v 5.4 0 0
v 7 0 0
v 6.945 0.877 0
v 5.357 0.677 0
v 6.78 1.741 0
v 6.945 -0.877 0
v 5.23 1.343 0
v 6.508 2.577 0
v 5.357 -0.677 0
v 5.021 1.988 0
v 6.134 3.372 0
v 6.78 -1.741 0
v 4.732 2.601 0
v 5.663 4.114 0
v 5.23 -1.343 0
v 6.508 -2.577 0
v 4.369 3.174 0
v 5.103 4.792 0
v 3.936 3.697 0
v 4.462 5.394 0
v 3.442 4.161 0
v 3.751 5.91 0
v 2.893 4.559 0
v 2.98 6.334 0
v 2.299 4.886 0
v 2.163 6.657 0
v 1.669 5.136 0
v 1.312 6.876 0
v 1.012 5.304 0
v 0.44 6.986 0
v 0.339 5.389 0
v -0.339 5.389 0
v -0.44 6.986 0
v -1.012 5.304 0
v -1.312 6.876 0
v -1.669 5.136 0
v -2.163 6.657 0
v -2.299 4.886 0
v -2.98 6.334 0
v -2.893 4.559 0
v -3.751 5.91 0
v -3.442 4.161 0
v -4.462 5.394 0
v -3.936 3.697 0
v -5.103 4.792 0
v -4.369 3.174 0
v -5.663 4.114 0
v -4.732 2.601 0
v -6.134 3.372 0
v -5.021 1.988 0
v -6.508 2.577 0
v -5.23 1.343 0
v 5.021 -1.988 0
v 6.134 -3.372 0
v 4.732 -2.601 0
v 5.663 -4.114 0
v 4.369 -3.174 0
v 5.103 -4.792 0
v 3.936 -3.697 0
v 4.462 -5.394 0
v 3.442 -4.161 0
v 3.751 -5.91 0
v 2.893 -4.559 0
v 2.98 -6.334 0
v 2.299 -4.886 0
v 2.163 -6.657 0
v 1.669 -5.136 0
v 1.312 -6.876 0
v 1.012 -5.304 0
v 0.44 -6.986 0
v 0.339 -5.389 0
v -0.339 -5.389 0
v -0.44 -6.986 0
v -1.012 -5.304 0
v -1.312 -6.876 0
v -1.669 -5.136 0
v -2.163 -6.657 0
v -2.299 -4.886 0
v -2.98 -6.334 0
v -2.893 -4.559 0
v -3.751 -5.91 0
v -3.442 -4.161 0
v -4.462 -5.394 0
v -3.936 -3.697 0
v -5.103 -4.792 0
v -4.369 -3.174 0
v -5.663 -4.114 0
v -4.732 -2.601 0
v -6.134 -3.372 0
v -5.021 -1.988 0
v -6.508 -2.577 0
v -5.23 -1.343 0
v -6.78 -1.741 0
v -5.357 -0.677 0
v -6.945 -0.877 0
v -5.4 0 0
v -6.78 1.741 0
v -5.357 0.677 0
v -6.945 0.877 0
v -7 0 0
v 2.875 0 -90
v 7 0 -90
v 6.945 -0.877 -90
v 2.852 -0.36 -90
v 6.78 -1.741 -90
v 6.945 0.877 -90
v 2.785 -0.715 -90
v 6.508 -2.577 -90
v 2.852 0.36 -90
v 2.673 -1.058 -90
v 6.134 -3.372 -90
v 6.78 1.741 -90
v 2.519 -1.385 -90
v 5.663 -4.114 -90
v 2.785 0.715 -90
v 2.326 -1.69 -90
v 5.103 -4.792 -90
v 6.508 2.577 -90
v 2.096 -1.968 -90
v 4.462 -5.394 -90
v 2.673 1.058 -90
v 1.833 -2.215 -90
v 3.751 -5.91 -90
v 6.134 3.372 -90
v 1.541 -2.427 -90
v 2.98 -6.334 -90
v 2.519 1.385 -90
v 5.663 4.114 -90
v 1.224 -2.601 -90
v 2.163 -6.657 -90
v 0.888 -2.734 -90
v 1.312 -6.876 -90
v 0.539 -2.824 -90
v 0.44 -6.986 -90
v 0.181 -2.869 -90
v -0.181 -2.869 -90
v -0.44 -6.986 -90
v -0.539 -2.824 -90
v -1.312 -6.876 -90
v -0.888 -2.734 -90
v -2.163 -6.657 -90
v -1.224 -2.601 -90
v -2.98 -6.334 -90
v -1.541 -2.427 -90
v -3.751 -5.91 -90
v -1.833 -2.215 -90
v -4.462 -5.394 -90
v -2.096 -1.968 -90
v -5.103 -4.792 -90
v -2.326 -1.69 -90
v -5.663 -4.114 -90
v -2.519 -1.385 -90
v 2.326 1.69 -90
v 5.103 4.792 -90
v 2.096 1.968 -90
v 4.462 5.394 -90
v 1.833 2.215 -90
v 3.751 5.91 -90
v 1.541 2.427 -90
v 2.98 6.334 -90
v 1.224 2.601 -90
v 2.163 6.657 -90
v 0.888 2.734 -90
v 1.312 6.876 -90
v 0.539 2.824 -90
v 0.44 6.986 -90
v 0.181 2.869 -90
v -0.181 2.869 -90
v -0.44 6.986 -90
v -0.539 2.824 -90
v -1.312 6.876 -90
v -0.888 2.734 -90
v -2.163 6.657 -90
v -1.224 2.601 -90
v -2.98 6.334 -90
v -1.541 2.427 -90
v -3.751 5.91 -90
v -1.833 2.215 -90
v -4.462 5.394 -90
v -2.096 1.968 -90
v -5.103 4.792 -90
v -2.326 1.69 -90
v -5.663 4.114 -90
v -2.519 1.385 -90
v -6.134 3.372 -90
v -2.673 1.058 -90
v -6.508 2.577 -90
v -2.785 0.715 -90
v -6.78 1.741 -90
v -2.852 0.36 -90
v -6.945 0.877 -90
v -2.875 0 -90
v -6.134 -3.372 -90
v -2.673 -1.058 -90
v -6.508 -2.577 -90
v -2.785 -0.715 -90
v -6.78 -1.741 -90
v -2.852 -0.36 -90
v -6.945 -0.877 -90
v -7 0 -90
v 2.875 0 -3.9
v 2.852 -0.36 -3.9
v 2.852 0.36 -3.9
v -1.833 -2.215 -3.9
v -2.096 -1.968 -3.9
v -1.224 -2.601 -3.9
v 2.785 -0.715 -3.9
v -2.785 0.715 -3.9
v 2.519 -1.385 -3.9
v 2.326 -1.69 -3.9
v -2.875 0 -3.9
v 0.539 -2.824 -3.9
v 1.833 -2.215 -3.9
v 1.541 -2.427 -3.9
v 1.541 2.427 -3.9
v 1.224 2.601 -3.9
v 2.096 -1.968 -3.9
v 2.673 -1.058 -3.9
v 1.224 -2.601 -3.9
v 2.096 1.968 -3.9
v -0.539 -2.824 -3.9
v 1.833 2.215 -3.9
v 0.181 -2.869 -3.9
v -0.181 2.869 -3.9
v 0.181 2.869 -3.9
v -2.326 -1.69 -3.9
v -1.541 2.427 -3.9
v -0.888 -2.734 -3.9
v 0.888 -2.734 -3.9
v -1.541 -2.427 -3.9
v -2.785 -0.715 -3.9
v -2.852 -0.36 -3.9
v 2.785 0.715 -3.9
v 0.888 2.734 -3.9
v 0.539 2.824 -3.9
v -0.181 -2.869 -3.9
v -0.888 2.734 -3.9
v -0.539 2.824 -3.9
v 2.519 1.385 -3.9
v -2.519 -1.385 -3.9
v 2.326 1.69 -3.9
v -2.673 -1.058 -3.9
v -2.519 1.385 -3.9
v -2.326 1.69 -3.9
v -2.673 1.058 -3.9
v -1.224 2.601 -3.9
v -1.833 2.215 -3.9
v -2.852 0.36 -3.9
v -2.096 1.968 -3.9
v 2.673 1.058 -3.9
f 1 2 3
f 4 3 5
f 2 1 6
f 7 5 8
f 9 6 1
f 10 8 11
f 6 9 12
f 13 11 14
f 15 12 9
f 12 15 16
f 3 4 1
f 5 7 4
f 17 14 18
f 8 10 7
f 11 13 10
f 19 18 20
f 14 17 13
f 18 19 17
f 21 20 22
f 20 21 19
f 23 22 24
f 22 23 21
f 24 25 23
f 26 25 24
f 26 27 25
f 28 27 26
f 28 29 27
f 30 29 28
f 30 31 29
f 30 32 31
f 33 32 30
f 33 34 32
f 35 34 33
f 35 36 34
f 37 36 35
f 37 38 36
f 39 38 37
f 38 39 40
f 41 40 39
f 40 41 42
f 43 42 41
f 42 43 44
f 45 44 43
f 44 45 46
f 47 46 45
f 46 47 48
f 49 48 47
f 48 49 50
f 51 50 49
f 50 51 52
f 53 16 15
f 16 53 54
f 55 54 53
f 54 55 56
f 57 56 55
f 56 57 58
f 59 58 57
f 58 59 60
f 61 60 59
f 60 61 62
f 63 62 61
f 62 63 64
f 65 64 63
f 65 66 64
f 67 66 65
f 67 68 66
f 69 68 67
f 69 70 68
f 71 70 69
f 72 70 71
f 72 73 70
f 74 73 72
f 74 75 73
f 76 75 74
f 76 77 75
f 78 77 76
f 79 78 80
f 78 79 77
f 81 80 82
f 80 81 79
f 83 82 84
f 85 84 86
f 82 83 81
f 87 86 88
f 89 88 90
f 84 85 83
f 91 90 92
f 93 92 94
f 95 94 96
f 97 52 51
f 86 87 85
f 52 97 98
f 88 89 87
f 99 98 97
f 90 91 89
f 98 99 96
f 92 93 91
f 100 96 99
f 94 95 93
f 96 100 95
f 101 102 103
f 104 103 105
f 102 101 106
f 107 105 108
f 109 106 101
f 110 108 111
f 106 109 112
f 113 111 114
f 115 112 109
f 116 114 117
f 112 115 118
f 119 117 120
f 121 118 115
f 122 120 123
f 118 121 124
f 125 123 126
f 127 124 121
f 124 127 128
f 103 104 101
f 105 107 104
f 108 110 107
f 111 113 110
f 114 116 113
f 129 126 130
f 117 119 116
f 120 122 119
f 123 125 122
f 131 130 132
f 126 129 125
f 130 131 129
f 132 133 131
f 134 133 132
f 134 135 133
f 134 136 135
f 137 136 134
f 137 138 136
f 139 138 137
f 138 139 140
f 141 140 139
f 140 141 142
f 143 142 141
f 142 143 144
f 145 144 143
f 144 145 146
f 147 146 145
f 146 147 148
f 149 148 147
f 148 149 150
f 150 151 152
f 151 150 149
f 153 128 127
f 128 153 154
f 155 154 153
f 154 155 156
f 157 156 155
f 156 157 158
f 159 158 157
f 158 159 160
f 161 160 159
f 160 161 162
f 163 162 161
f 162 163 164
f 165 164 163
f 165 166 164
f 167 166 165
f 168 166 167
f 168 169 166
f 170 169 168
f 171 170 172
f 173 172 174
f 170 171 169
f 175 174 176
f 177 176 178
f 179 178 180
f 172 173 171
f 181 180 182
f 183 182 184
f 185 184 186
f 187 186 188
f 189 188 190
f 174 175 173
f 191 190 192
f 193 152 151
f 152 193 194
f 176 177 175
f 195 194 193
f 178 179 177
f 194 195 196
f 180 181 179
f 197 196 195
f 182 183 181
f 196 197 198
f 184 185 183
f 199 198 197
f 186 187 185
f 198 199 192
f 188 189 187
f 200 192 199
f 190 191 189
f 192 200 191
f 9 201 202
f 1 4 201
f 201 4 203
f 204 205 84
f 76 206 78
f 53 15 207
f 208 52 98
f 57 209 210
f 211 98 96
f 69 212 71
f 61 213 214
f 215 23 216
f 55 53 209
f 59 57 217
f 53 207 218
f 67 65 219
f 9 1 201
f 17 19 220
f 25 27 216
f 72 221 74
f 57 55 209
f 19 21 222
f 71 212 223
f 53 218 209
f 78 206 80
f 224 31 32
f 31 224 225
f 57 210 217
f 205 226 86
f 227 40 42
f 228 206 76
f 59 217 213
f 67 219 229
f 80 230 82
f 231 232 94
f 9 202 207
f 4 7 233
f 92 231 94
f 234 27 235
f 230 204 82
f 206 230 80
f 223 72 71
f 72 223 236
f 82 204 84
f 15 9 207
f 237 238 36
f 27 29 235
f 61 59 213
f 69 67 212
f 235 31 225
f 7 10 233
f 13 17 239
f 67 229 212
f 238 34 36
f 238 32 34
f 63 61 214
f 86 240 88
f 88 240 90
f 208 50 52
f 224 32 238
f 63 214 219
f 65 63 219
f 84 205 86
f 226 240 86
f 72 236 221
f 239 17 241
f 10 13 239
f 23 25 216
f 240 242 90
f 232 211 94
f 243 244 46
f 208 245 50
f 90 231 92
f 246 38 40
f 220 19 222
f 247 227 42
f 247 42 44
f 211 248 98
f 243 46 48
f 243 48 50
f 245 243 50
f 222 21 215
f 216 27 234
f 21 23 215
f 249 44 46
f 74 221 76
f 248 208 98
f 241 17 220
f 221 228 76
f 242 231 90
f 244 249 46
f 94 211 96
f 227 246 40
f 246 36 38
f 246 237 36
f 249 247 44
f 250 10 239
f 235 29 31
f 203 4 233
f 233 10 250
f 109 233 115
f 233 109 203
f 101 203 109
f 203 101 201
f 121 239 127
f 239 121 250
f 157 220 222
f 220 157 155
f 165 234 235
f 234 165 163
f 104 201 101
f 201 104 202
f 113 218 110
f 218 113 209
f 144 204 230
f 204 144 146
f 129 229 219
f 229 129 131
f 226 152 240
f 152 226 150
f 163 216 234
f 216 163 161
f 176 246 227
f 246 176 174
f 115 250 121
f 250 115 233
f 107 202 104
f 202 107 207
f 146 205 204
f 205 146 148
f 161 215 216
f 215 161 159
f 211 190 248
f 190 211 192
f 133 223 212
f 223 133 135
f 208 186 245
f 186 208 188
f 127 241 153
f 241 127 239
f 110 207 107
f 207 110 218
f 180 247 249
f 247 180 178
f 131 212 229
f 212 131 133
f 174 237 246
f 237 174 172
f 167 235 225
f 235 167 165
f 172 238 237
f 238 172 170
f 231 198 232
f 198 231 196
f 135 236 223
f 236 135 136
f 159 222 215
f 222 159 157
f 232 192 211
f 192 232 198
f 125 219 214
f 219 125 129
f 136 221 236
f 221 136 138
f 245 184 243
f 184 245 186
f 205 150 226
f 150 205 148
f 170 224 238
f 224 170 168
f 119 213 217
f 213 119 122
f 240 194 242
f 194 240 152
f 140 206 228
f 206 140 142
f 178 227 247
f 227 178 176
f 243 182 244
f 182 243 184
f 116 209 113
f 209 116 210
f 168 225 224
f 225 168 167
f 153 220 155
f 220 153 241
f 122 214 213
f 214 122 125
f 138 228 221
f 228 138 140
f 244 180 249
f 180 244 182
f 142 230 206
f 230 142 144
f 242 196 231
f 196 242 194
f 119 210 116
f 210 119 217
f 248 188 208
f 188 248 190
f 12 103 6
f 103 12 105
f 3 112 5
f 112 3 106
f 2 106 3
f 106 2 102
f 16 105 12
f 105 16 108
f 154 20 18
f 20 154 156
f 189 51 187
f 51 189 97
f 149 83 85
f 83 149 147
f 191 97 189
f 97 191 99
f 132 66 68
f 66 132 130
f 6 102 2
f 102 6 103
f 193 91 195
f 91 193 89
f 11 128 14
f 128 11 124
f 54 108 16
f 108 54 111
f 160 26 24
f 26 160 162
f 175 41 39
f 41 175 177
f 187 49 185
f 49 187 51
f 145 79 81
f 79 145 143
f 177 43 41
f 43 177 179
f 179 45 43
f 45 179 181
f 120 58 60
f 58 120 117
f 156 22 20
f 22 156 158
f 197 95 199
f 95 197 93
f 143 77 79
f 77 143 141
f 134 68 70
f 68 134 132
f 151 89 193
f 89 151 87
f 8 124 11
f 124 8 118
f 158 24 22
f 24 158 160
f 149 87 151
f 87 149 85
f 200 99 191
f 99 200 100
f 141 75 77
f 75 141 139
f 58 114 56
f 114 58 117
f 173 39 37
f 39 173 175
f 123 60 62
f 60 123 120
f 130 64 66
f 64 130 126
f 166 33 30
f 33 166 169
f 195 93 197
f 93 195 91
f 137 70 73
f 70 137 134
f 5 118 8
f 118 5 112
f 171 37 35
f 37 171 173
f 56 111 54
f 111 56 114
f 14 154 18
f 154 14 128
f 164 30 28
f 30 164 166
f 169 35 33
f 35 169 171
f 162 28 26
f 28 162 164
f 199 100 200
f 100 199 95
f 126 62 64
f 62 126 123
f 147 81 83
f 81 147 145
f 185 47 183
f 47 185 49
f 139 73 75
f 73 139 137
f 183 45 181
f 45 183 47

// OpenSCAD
$fn = 50;


difference() {
	union() {
		translate(v = [0, 0, -90.0000000000]) {
			cylinder(h = 90, r = 7.0000000000);
		}
		cylinder(h = 0, r = 13.0000000000);
	}
	union() {
		translate(v = [0, 0, 0]) {
			rotate(a = [0, 0, 0]) {
				difference() {
					union() {
						#translate(v = [0, 0, -90.0000000000]) {
							cylinder(h = 90, r = 2.6000000000);
						}
						#translate(v = [0, 0, -3.9000000000]) {
							cylinder(h = 3.9000000000, r = 7.0000000000, r1 = 2.8750000000, r2 = 5.4000000000);
						}
						#translate(v = [0, 0, -90.0000000000]) {
							cylinder(h = 90, r = 2.8750000000);
						}
						#translate(v = [0, 0, -90.0000000000]) {
							cylinder(h = 90, r = 2.6000000000);
						}
					}
					union();
				}
			}
		}
	}
}
